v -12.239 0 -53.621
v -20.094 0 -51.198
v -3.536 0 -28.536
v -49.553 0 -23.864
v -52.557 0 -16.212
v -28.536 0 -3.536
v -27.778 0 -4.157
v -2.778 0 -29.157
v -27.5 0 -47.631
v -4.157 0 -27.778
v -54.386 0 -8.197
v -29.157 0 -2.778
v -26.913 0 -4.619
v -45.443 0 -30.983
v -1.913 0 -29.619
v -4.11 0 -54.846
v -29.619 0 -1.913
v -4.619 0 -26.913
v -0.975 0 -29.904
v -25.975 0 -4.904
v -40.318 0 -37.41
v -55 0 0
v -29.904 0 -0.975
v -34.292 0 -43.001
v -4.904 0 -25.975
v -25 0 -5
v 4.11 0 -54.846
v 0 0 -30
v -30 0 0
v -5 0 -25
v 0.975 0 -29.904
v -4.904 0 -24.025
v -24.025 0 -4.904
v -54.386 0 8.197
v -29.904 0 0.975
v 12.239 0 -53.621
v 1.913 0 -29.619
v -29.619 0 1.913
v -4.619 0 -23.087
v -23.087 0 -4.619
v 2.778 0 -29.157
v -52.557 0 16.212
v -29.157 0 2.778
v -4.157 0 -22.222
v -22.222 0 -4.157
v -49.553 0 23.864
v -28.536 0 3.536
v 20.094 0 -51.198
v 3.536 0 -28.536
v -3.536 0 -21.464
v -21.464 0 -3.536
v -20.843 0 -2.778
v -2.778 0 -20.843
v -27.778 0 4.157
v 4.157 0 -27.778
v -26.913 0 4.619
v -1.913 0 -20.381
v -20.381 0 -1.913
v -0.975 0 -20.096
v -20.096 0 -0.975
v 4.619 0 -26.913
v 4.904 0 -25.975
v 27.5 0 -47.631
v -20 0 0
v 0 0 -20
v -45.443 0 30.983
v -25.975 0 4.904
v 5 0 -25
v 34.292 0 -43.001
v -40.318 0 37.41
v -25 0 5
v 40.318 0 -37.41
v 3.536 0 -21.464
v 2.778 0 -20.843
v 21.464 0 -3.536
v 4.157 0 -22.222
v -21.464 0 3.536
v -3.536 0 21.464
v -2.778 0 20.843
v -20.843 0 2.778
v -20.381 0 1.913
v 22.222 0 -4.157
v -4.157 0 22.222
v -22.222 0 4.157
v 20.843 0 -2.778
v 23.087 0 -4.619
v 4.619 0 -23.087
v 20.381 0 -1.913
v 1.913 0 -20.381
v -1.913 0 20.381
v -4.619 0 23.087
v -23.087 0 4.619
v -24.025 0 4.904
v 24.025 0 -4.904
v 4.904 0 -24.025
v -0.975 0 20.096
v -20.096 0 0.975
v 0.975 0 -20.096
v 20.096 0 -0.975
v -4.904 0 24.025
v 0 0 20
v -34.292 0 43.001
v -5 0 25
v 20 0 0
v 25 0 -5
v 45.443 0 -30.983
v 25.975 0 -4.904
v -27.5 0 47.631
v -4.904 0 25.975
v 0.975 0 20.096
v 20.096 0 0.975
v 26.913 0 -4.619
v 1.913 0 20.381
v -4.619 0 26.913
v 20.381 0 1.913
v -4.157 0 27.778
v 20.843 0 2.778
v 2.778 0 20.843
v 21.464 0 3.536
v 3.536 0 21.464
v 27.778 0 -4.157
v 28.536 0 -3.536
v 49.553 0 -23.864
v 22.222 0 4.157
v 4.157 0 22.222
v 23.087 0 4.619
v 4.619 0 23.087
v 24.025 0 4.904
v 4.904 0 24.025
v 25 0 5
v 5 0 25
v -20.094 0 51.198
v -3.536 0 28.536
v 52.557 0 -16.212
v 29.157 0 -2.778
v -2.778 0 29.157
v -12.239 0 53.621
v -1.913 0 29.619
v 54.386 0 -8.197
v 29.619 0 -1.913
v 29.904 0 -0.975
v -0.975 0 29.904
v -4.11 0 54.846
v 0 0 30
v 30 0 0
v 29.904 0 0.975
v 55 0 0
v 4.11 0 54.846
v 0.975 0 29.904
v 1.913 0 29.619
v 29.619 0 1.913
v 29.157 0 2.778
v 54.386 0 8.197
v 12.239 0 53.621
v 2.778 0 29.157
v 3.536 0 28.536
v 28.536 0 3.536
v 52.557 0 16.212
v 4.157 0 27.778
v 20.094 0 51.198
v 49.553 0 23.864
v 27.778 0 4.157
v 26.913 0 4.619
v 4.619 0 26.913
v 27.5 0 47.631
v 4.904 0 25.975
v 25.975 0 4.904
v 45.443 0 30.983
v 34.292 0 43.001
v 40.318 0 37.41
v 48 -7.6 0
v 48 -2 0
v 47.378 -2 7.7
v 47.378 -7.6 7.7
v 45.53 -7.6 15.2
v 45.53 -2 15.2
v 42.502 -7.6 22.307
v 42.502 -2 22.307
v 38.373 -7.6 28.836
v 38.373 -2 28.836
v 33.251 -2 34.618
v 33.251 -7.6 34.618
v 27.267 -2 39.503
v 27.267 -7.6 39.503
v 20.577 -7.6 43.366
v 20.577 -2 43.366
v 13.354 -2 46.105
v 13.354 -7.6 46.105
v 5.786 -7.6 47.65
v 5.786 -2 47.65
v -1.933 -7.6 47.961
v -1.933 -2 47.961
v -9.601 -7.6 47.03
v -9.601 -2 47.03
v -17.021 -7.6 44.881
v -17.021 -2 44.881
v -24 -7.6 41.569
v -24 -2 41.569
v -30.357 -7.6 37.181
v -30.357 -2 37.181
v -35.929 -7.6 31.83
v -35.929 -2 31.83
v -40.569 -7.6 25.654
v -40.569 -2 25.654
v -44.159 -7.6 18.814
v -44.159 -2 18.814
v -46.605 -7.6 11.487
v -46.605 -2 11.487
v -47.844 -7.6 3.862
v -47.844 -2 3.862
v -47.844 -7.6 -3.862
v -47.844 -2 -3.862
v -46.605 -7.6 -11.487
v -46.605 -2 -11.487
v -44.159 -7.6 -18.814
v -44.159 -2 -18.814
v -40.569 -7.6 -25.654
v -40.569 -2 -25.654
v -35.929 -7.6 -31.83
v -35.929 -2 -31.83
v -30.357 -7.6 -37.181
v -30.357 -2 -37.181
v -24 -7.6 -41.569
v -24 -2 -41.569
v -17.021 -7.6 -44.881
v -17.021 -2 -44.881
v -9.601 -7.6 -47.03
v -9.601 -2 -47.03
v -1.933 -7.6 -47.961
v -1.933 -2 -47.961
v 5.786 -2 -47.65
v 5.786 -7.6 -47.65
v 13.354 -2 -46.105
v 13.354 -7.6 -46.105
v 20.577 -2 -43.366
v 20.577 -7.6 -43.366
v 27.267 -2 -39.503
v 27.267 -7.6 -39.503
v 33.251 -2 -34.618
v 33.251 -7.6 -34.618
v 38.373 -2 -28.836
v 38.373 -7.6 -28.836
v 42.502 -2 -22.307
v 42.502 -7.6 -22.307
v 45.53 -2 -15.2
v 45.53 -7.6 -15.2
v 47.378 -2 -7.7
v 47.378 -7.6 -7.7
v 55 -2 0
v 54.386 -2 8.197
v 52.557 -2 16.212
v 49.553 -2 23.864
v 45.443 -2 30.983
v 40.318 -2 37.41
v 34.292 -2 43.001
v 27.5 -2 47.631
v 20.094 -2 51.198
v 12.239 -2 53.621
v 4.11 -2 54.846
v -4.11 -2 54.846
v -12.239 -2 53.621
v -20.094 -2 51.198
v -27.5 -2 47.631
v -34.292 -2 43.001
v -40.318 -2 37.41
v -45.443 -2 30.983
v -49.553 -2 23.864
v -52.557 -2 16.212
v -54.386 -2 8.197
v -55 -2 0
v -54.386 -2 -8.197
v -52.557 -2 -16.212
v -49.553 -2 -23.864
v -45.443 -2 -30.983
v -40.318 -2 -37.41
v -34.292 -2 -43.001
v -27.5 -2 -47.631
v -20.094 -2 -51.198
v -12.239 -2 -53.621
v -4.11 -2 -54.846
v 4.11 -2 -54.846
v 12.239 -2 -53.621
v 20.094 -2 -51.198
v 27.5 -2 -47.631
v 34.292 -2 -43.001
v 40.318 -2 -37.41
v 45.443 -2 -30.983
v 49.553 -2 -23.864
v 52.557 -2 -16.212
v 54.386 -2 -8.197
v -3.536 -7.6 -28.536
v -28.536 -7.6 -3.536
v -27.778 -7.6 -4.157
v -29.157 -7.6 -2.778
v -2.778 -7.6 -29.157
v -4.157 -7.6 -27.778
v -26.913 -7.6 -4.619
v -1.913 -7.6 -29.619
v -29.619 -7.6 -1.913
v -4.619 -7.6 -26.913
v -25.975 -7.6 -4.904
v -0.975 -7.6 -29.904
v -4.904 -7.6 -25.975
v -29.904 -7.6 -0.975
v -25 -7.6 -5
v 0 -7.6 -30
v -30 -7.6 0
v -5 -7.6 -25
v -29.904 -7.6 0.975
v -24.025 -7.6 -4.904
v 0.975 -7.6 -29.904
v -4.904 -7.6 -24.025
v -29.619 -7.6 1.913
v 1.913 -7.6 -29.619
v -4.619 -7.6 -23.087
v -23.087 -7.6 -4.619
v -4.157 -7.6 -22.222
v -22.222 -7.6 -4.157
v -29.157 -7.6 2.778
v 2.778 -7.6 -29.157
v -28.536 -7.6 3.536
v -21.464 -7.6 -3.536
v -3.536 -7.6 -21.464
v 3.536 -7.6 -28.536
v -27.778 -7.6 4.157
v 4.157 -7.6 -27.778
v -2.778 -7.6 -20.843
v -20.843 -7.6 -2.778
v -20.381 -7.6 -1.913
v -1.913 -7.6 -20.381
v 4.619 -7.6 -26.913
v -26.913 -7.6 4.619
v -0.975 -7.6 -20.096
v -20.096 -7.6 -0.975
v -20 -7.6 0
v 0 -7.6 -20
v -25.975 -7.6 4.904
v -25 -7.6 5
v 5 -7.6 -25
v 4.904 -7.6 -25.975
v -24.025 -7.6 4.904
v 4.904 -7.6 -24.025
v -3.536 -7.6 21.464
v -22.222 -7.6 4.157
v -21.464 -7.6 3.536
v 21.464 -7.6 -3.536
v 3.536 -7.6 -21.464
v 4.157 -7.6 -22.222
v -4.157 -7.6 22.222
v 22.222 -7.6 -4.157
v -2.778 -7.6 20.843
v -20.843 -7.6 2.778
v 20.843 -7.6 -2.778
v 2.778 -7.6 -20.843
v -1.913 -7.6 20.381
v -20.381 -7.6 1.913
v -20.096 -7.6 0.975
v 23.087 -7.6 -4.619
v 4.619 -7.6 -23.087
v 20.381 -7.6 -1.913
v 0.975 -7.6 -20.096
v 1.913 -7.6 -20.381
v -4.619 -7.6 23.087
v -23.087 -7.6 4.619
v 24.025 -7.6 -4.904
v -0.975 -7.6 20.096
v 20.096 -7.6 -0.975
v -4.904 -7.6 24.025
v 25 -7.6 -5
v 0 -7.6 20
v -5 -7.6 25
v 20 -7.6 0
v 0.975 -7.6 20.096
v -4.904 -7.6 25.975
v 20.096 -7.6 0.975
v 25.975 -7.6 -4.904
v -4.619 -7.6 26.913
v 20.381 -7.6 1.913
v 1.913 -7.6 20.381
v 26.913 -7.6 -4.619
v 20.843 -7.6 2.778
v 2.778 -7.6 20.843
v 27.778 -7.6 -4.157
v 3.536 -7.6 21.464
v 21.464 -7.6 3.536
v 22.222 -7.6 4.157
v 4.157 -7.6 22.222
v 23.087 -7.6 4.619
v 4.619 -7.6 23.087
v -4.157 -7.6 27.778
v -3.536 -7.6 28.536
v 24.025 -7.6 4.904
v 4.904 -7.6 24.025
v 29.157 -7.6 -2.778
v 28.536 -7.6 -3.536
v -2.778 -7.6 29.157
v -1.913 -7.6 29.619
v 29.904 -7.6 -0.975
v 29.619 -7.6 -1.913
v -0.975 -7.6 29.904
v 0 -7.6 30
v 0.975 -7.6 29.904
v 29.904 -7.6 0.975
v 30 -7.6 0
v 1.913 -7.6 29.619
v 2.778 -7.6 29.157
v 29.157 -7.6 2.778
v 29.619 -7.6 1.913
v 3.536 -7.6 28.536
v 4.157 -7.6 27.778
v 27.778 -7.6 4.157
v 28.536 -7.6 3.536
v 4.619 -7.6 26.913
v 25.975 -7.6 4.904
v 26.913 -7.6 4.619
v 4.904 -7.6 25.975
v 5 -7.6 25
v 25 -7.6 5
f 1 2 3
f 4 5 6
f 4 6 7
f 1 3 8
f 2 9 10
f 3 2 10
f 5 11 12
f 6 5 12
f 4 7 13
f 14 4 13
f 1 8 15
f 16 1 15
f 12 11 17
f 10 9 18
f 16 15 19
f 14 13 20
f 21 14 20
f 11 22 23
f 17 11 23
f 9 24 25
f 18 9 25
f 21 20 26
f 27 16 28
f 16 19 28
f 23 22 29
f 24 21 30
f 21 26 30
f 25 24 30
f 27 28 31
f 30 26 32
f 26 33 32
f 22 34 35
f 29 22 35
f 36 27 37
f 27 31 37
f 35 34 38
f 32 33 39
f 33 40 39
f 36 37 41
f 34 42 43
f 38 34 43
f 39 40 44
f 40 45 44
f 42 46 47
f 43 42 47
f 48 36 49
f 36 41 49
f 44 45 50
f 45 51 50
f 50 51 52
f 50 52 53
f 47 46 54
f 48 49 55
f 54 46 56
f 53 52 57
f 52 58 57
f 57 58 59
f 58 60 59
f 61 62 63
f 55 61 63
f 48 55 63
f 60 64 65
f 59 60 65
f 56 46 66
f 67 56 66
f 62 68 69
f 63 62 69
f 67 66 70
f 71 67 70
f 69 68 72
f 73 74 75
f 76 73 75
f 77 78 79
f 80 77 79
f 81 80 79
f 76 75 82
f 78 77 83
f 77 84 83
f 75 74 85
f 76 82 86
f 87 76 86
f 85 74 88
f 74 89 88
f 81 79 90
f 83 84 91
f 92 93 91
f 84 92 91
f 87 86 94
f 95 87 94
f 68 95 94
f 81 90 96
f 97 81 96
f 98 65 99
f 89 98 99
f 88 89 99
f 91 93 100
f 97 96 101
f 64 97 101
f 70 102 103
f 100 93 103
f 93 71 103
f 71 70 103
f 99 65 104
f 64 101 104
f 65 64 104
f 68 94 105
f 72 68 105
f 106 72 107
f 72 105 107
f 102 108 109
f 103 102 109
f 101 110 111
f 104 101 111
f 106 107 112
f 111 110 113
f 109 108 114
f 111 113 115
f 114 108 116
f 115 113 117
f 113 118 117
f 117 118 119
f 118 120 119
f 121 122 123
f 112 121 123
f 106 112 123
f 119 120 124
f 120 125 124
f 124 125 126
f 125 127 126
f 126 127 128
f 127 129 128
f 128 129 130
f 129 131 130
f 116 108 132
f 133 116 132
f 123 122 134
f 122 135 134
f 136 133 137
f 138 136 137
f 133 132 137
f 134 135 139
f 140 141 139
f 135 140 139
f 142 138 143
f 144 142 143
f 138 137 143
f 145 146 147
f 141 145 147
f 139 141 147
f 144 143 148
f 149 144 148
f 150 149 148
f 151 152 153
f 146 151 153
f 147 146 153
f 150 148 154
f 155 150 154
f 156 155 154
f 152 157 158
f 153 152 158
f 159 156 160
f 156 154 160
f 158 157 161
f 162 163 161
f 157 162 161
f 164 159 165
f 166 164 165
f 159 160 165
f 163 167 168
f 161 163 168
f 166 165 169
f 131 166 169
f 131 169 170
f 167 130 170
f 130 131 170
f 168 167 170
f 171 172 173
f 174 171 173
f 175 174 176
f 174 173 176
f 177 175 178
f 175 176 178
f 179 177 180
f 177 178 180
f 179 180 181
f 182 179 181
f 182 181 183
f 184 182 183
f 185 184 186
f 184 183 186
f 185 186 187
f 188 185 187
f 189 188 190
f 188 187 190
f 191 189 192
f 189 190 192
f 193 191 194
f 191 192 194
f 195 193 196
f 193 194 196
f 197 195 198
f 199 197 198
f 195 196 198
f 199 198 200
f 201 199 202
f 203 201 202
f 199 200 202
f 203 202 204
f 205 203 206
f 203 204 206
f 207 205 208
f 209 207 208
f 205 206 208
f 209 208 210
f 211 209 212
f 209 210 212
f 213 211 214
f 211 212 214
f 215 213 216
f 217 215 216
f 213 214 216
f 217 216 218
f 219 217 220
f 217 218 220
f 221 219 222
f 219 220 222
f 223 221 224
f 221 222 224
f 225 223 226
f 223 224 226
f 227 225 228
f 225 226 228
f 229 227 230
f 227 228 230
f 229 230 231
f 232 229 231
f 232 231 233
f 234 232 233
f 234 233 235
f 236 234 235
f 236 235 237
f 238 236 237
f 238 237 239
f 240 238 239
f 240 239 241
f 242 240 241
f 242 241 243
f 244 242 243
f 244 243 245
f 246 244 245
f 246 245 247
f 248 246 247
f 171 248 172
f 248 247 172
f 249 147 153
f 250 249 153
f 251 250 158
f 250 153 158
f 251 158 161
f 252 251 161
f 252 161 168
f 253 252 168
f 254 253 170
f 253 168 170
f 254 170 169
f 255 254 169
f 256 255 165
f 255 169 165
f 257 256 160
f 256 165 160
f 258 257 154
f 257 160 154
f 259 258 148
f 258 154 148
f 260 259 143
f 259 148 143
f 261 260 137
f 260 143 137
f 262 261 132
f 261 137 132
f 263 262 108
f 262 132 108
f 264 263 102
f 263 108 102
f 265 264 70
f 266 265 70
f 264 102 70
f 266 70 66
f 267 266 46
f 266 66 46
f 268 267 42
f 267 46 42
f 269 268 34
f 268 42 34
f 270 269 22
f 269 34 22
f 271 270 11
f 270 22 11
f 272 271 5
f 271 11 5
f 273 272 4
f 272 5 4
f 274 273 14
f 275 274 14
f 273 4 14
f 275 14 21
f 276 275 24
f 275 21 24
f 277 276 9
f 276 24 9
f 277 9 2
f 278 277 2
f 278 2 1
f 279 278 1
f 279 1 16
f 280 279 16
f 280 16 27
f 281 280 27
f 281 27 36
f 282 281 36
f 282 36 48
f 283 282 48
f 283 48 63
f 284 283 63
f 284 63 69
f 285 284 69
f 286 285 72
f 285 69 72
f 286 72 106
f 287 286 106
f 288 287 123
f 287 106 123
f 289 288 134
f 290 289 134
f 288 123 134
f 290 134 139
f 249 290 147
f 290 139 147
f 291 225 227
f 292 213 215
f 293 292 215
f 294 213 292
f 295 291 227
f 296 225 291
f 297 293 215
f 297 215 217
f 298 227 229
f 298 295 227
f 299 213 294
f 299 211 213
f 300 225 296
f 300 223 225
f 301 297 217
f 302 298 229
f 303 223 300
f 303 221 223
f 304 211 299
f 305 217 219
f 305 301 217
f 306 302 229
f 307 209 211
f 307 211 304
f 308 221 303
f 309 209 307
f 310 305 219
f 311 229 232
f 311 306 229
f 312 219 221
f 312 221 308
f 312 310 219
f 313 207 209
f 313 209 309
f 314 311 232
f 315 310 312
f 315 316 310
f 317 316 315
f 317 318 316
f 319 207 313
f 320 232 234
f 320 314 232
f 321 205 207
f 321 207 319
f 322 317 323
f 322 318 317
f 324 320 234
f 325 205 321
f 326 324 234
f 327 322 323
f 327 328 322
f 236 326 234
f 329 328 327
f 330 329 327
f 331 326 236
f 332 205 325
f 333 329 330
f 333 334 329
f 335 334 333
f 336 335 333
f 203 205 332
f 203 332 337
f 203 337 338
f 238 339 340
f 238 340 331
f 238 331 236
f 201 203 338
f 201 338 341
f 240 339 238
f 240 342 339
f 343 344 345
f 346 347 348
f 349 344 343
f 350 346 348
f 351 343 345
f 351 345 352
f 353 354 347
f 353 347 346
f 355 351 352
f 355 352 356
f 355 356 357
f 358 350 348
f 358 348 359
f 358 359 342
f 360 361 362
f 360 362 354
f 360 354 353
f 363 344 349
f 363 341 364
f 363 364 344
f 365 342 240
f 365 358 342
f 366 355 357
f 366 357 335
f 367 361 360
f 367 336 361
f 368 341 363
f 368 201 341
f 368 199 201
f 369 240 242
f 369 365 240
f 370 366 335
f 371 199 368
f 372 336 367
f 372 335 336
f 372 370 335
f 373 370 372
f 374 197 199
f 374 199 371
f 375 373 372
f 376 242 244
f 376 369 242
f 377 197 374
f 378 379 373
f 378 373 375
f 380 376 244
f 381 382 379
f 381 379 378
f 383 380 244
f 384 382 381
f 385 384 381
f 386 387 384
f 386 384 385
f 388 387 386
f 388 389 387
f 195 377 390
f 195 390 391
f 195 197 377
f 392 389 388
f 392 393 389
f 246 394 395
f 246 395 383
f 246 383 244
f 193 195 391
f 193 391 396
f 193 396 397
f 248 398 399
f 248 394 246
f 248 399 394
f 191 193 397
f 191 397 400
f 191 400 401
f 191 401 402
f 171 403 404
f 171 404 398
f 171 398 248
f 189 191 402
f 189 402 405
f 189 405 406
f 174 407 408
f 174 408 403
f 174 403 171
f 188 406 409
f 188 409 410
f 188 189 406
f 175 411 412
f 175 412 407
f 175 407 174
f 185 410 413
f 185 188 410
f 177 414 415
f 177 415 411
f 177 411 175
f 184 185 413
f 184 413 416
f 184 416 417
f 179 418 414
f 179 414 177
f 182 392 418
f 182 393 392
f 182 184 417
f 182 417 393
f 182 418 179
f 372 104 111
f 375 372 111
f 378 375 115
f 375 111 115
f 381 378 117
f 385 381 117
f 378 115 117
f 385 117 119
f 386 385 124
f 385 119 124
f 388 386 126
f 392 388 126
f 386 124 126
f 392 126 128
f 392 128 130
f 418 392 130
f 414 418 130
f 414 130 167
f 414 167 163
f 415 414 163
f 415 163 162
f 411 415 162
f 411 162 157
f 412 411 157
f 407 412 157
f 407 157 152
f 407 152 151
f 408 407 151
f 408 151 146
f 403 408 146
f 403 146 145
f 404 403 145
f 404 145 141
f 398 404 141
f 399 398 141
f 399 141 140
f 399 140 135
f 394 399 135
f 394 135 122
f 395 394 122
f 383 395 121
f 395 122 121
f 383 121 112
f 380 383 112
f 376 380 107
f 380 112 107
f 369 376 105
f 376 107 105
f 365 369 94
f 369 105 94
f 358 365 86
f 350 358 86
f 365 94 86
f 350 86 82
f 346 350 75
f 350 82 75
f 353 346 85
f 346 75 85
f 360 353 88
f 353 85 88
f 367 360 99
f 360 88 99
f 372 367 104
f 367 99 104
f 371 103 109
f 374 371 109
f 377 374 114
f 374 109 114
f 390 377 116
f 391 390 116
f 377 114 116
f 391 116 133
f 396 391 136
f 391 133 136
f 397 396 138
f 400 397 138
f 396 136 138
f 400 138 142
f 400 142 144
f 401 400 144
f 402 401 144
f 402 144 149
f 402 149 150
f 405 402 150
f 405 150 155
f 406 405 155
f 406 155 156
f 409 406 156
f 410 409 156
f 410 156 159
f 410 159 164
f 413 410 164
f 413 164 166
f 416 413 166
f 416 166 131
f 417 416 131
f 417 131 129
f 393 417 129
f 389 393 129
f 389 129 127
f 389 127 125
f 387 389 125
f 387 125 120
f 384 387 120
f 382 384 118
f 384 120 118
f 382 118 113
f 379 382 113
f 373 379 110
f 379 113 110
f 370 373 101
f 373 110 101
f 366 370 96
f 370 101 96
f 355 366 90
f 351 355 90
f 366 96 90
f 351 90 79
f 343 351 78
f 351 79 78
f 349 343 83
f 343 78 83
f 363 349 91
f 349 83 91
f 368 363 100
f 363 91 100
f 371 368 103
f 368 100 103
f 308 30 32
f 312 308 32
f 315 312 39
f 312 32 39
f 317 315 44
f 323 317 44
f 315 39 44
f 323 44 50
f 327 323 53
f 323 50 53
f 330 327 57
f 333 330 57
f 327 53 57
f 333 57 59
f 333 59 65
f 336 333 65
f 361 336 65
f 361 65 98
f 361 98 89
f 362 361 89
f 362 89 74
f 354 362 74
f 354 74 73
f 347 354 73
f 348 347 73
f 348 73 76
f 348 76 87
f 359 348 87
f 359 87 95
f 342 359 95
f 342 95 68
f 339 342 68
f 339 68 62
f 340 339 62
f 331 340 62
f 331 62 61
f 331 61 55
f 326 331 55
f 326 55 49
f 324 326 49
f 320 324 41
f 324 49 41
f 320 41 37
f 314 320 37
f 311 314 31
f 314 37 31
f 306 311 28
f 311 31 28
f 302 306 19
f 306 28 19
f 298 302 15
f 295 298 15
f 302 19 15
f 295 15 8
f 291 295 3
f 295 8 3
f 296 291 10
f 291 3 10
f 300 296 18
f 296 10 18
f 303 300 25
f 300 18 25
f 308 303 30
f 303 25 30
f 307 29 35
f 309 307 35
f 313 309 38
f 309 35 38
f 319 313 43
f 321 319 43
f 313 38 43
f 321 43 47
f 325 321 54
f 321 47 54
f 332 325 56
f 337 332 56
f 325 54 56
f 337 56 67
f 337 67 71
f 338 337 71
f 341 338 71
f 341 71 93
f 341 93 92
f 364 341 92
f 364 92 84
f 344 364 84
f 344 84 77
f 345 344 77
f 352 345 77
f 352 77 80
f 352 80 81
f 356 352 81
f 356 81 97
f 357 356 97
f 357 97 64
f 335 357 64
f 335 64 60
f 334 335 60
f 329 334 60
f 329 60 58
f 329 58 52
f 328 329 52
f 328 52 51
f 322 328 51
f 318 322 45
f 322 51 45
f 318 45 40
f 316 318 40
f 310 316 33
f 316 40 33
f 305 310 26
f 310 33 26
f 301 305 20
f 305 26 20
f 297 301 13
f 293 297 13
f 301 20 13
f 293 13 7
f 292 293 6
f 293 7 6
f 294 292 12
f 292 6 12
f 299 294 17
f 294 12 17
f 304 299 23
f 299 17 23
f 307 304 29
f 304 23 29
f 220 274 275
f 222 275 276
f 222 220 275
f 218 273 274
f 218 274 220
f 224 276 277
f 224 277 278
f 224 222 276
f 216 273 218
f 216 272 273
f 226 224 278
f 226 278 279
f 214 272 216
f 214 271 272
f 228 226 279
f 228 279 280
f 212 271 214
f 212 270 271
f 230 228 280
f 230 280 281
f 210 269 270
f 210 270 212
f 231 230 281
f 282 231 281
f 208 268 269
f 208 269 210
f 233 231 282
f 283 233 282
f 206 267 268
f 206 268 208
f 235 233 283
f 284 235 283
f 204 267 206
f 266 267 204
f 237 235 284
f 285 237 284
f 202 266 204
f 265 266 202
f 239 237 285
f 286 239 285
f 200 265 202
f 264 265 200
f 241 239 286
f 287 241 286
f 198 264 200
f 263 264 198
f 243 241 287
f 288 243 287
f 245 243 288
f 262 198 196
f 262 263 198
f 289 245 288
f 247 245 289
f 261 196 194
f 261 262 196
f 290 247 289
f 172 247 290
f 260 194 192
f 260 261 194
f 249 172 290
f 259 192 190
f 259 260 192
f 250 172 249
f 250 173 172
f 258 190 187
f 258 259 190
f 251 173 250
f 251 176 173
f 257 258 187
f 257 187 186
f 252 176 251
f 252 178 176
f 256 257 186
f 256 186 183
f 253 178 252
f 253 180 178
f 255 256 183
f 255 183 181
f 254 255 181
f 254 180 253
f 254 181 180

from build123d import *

# Parameters (mm, degrees)
F0_R     = 55
F1_DEPTH = 2
F2_R     = 48
F3_DEPTH = 5.6
F5_D     = 10


with BuildPart() as f1:
    # F0 (on Front) → F1 (new body)
    with BuildSketch(Plane.XZ):
        Circle(F0_R)
    extrude(amount=F1_DEPTH)

    # F2 (on face) → F3 (join)
    with BuildSketch(Plane.XZ.offset(2)):
        Circle(F2_R)
    extrude(amount=F3_DEPTH)

    # F5 (through all)
    with Locations(Plane.XZ.offset(7.6)):
        with Locations((-25, 0), (0, 25), (25, 0), (0, -25)):
            Hole(F5_D / 2)


solid = f1.part
